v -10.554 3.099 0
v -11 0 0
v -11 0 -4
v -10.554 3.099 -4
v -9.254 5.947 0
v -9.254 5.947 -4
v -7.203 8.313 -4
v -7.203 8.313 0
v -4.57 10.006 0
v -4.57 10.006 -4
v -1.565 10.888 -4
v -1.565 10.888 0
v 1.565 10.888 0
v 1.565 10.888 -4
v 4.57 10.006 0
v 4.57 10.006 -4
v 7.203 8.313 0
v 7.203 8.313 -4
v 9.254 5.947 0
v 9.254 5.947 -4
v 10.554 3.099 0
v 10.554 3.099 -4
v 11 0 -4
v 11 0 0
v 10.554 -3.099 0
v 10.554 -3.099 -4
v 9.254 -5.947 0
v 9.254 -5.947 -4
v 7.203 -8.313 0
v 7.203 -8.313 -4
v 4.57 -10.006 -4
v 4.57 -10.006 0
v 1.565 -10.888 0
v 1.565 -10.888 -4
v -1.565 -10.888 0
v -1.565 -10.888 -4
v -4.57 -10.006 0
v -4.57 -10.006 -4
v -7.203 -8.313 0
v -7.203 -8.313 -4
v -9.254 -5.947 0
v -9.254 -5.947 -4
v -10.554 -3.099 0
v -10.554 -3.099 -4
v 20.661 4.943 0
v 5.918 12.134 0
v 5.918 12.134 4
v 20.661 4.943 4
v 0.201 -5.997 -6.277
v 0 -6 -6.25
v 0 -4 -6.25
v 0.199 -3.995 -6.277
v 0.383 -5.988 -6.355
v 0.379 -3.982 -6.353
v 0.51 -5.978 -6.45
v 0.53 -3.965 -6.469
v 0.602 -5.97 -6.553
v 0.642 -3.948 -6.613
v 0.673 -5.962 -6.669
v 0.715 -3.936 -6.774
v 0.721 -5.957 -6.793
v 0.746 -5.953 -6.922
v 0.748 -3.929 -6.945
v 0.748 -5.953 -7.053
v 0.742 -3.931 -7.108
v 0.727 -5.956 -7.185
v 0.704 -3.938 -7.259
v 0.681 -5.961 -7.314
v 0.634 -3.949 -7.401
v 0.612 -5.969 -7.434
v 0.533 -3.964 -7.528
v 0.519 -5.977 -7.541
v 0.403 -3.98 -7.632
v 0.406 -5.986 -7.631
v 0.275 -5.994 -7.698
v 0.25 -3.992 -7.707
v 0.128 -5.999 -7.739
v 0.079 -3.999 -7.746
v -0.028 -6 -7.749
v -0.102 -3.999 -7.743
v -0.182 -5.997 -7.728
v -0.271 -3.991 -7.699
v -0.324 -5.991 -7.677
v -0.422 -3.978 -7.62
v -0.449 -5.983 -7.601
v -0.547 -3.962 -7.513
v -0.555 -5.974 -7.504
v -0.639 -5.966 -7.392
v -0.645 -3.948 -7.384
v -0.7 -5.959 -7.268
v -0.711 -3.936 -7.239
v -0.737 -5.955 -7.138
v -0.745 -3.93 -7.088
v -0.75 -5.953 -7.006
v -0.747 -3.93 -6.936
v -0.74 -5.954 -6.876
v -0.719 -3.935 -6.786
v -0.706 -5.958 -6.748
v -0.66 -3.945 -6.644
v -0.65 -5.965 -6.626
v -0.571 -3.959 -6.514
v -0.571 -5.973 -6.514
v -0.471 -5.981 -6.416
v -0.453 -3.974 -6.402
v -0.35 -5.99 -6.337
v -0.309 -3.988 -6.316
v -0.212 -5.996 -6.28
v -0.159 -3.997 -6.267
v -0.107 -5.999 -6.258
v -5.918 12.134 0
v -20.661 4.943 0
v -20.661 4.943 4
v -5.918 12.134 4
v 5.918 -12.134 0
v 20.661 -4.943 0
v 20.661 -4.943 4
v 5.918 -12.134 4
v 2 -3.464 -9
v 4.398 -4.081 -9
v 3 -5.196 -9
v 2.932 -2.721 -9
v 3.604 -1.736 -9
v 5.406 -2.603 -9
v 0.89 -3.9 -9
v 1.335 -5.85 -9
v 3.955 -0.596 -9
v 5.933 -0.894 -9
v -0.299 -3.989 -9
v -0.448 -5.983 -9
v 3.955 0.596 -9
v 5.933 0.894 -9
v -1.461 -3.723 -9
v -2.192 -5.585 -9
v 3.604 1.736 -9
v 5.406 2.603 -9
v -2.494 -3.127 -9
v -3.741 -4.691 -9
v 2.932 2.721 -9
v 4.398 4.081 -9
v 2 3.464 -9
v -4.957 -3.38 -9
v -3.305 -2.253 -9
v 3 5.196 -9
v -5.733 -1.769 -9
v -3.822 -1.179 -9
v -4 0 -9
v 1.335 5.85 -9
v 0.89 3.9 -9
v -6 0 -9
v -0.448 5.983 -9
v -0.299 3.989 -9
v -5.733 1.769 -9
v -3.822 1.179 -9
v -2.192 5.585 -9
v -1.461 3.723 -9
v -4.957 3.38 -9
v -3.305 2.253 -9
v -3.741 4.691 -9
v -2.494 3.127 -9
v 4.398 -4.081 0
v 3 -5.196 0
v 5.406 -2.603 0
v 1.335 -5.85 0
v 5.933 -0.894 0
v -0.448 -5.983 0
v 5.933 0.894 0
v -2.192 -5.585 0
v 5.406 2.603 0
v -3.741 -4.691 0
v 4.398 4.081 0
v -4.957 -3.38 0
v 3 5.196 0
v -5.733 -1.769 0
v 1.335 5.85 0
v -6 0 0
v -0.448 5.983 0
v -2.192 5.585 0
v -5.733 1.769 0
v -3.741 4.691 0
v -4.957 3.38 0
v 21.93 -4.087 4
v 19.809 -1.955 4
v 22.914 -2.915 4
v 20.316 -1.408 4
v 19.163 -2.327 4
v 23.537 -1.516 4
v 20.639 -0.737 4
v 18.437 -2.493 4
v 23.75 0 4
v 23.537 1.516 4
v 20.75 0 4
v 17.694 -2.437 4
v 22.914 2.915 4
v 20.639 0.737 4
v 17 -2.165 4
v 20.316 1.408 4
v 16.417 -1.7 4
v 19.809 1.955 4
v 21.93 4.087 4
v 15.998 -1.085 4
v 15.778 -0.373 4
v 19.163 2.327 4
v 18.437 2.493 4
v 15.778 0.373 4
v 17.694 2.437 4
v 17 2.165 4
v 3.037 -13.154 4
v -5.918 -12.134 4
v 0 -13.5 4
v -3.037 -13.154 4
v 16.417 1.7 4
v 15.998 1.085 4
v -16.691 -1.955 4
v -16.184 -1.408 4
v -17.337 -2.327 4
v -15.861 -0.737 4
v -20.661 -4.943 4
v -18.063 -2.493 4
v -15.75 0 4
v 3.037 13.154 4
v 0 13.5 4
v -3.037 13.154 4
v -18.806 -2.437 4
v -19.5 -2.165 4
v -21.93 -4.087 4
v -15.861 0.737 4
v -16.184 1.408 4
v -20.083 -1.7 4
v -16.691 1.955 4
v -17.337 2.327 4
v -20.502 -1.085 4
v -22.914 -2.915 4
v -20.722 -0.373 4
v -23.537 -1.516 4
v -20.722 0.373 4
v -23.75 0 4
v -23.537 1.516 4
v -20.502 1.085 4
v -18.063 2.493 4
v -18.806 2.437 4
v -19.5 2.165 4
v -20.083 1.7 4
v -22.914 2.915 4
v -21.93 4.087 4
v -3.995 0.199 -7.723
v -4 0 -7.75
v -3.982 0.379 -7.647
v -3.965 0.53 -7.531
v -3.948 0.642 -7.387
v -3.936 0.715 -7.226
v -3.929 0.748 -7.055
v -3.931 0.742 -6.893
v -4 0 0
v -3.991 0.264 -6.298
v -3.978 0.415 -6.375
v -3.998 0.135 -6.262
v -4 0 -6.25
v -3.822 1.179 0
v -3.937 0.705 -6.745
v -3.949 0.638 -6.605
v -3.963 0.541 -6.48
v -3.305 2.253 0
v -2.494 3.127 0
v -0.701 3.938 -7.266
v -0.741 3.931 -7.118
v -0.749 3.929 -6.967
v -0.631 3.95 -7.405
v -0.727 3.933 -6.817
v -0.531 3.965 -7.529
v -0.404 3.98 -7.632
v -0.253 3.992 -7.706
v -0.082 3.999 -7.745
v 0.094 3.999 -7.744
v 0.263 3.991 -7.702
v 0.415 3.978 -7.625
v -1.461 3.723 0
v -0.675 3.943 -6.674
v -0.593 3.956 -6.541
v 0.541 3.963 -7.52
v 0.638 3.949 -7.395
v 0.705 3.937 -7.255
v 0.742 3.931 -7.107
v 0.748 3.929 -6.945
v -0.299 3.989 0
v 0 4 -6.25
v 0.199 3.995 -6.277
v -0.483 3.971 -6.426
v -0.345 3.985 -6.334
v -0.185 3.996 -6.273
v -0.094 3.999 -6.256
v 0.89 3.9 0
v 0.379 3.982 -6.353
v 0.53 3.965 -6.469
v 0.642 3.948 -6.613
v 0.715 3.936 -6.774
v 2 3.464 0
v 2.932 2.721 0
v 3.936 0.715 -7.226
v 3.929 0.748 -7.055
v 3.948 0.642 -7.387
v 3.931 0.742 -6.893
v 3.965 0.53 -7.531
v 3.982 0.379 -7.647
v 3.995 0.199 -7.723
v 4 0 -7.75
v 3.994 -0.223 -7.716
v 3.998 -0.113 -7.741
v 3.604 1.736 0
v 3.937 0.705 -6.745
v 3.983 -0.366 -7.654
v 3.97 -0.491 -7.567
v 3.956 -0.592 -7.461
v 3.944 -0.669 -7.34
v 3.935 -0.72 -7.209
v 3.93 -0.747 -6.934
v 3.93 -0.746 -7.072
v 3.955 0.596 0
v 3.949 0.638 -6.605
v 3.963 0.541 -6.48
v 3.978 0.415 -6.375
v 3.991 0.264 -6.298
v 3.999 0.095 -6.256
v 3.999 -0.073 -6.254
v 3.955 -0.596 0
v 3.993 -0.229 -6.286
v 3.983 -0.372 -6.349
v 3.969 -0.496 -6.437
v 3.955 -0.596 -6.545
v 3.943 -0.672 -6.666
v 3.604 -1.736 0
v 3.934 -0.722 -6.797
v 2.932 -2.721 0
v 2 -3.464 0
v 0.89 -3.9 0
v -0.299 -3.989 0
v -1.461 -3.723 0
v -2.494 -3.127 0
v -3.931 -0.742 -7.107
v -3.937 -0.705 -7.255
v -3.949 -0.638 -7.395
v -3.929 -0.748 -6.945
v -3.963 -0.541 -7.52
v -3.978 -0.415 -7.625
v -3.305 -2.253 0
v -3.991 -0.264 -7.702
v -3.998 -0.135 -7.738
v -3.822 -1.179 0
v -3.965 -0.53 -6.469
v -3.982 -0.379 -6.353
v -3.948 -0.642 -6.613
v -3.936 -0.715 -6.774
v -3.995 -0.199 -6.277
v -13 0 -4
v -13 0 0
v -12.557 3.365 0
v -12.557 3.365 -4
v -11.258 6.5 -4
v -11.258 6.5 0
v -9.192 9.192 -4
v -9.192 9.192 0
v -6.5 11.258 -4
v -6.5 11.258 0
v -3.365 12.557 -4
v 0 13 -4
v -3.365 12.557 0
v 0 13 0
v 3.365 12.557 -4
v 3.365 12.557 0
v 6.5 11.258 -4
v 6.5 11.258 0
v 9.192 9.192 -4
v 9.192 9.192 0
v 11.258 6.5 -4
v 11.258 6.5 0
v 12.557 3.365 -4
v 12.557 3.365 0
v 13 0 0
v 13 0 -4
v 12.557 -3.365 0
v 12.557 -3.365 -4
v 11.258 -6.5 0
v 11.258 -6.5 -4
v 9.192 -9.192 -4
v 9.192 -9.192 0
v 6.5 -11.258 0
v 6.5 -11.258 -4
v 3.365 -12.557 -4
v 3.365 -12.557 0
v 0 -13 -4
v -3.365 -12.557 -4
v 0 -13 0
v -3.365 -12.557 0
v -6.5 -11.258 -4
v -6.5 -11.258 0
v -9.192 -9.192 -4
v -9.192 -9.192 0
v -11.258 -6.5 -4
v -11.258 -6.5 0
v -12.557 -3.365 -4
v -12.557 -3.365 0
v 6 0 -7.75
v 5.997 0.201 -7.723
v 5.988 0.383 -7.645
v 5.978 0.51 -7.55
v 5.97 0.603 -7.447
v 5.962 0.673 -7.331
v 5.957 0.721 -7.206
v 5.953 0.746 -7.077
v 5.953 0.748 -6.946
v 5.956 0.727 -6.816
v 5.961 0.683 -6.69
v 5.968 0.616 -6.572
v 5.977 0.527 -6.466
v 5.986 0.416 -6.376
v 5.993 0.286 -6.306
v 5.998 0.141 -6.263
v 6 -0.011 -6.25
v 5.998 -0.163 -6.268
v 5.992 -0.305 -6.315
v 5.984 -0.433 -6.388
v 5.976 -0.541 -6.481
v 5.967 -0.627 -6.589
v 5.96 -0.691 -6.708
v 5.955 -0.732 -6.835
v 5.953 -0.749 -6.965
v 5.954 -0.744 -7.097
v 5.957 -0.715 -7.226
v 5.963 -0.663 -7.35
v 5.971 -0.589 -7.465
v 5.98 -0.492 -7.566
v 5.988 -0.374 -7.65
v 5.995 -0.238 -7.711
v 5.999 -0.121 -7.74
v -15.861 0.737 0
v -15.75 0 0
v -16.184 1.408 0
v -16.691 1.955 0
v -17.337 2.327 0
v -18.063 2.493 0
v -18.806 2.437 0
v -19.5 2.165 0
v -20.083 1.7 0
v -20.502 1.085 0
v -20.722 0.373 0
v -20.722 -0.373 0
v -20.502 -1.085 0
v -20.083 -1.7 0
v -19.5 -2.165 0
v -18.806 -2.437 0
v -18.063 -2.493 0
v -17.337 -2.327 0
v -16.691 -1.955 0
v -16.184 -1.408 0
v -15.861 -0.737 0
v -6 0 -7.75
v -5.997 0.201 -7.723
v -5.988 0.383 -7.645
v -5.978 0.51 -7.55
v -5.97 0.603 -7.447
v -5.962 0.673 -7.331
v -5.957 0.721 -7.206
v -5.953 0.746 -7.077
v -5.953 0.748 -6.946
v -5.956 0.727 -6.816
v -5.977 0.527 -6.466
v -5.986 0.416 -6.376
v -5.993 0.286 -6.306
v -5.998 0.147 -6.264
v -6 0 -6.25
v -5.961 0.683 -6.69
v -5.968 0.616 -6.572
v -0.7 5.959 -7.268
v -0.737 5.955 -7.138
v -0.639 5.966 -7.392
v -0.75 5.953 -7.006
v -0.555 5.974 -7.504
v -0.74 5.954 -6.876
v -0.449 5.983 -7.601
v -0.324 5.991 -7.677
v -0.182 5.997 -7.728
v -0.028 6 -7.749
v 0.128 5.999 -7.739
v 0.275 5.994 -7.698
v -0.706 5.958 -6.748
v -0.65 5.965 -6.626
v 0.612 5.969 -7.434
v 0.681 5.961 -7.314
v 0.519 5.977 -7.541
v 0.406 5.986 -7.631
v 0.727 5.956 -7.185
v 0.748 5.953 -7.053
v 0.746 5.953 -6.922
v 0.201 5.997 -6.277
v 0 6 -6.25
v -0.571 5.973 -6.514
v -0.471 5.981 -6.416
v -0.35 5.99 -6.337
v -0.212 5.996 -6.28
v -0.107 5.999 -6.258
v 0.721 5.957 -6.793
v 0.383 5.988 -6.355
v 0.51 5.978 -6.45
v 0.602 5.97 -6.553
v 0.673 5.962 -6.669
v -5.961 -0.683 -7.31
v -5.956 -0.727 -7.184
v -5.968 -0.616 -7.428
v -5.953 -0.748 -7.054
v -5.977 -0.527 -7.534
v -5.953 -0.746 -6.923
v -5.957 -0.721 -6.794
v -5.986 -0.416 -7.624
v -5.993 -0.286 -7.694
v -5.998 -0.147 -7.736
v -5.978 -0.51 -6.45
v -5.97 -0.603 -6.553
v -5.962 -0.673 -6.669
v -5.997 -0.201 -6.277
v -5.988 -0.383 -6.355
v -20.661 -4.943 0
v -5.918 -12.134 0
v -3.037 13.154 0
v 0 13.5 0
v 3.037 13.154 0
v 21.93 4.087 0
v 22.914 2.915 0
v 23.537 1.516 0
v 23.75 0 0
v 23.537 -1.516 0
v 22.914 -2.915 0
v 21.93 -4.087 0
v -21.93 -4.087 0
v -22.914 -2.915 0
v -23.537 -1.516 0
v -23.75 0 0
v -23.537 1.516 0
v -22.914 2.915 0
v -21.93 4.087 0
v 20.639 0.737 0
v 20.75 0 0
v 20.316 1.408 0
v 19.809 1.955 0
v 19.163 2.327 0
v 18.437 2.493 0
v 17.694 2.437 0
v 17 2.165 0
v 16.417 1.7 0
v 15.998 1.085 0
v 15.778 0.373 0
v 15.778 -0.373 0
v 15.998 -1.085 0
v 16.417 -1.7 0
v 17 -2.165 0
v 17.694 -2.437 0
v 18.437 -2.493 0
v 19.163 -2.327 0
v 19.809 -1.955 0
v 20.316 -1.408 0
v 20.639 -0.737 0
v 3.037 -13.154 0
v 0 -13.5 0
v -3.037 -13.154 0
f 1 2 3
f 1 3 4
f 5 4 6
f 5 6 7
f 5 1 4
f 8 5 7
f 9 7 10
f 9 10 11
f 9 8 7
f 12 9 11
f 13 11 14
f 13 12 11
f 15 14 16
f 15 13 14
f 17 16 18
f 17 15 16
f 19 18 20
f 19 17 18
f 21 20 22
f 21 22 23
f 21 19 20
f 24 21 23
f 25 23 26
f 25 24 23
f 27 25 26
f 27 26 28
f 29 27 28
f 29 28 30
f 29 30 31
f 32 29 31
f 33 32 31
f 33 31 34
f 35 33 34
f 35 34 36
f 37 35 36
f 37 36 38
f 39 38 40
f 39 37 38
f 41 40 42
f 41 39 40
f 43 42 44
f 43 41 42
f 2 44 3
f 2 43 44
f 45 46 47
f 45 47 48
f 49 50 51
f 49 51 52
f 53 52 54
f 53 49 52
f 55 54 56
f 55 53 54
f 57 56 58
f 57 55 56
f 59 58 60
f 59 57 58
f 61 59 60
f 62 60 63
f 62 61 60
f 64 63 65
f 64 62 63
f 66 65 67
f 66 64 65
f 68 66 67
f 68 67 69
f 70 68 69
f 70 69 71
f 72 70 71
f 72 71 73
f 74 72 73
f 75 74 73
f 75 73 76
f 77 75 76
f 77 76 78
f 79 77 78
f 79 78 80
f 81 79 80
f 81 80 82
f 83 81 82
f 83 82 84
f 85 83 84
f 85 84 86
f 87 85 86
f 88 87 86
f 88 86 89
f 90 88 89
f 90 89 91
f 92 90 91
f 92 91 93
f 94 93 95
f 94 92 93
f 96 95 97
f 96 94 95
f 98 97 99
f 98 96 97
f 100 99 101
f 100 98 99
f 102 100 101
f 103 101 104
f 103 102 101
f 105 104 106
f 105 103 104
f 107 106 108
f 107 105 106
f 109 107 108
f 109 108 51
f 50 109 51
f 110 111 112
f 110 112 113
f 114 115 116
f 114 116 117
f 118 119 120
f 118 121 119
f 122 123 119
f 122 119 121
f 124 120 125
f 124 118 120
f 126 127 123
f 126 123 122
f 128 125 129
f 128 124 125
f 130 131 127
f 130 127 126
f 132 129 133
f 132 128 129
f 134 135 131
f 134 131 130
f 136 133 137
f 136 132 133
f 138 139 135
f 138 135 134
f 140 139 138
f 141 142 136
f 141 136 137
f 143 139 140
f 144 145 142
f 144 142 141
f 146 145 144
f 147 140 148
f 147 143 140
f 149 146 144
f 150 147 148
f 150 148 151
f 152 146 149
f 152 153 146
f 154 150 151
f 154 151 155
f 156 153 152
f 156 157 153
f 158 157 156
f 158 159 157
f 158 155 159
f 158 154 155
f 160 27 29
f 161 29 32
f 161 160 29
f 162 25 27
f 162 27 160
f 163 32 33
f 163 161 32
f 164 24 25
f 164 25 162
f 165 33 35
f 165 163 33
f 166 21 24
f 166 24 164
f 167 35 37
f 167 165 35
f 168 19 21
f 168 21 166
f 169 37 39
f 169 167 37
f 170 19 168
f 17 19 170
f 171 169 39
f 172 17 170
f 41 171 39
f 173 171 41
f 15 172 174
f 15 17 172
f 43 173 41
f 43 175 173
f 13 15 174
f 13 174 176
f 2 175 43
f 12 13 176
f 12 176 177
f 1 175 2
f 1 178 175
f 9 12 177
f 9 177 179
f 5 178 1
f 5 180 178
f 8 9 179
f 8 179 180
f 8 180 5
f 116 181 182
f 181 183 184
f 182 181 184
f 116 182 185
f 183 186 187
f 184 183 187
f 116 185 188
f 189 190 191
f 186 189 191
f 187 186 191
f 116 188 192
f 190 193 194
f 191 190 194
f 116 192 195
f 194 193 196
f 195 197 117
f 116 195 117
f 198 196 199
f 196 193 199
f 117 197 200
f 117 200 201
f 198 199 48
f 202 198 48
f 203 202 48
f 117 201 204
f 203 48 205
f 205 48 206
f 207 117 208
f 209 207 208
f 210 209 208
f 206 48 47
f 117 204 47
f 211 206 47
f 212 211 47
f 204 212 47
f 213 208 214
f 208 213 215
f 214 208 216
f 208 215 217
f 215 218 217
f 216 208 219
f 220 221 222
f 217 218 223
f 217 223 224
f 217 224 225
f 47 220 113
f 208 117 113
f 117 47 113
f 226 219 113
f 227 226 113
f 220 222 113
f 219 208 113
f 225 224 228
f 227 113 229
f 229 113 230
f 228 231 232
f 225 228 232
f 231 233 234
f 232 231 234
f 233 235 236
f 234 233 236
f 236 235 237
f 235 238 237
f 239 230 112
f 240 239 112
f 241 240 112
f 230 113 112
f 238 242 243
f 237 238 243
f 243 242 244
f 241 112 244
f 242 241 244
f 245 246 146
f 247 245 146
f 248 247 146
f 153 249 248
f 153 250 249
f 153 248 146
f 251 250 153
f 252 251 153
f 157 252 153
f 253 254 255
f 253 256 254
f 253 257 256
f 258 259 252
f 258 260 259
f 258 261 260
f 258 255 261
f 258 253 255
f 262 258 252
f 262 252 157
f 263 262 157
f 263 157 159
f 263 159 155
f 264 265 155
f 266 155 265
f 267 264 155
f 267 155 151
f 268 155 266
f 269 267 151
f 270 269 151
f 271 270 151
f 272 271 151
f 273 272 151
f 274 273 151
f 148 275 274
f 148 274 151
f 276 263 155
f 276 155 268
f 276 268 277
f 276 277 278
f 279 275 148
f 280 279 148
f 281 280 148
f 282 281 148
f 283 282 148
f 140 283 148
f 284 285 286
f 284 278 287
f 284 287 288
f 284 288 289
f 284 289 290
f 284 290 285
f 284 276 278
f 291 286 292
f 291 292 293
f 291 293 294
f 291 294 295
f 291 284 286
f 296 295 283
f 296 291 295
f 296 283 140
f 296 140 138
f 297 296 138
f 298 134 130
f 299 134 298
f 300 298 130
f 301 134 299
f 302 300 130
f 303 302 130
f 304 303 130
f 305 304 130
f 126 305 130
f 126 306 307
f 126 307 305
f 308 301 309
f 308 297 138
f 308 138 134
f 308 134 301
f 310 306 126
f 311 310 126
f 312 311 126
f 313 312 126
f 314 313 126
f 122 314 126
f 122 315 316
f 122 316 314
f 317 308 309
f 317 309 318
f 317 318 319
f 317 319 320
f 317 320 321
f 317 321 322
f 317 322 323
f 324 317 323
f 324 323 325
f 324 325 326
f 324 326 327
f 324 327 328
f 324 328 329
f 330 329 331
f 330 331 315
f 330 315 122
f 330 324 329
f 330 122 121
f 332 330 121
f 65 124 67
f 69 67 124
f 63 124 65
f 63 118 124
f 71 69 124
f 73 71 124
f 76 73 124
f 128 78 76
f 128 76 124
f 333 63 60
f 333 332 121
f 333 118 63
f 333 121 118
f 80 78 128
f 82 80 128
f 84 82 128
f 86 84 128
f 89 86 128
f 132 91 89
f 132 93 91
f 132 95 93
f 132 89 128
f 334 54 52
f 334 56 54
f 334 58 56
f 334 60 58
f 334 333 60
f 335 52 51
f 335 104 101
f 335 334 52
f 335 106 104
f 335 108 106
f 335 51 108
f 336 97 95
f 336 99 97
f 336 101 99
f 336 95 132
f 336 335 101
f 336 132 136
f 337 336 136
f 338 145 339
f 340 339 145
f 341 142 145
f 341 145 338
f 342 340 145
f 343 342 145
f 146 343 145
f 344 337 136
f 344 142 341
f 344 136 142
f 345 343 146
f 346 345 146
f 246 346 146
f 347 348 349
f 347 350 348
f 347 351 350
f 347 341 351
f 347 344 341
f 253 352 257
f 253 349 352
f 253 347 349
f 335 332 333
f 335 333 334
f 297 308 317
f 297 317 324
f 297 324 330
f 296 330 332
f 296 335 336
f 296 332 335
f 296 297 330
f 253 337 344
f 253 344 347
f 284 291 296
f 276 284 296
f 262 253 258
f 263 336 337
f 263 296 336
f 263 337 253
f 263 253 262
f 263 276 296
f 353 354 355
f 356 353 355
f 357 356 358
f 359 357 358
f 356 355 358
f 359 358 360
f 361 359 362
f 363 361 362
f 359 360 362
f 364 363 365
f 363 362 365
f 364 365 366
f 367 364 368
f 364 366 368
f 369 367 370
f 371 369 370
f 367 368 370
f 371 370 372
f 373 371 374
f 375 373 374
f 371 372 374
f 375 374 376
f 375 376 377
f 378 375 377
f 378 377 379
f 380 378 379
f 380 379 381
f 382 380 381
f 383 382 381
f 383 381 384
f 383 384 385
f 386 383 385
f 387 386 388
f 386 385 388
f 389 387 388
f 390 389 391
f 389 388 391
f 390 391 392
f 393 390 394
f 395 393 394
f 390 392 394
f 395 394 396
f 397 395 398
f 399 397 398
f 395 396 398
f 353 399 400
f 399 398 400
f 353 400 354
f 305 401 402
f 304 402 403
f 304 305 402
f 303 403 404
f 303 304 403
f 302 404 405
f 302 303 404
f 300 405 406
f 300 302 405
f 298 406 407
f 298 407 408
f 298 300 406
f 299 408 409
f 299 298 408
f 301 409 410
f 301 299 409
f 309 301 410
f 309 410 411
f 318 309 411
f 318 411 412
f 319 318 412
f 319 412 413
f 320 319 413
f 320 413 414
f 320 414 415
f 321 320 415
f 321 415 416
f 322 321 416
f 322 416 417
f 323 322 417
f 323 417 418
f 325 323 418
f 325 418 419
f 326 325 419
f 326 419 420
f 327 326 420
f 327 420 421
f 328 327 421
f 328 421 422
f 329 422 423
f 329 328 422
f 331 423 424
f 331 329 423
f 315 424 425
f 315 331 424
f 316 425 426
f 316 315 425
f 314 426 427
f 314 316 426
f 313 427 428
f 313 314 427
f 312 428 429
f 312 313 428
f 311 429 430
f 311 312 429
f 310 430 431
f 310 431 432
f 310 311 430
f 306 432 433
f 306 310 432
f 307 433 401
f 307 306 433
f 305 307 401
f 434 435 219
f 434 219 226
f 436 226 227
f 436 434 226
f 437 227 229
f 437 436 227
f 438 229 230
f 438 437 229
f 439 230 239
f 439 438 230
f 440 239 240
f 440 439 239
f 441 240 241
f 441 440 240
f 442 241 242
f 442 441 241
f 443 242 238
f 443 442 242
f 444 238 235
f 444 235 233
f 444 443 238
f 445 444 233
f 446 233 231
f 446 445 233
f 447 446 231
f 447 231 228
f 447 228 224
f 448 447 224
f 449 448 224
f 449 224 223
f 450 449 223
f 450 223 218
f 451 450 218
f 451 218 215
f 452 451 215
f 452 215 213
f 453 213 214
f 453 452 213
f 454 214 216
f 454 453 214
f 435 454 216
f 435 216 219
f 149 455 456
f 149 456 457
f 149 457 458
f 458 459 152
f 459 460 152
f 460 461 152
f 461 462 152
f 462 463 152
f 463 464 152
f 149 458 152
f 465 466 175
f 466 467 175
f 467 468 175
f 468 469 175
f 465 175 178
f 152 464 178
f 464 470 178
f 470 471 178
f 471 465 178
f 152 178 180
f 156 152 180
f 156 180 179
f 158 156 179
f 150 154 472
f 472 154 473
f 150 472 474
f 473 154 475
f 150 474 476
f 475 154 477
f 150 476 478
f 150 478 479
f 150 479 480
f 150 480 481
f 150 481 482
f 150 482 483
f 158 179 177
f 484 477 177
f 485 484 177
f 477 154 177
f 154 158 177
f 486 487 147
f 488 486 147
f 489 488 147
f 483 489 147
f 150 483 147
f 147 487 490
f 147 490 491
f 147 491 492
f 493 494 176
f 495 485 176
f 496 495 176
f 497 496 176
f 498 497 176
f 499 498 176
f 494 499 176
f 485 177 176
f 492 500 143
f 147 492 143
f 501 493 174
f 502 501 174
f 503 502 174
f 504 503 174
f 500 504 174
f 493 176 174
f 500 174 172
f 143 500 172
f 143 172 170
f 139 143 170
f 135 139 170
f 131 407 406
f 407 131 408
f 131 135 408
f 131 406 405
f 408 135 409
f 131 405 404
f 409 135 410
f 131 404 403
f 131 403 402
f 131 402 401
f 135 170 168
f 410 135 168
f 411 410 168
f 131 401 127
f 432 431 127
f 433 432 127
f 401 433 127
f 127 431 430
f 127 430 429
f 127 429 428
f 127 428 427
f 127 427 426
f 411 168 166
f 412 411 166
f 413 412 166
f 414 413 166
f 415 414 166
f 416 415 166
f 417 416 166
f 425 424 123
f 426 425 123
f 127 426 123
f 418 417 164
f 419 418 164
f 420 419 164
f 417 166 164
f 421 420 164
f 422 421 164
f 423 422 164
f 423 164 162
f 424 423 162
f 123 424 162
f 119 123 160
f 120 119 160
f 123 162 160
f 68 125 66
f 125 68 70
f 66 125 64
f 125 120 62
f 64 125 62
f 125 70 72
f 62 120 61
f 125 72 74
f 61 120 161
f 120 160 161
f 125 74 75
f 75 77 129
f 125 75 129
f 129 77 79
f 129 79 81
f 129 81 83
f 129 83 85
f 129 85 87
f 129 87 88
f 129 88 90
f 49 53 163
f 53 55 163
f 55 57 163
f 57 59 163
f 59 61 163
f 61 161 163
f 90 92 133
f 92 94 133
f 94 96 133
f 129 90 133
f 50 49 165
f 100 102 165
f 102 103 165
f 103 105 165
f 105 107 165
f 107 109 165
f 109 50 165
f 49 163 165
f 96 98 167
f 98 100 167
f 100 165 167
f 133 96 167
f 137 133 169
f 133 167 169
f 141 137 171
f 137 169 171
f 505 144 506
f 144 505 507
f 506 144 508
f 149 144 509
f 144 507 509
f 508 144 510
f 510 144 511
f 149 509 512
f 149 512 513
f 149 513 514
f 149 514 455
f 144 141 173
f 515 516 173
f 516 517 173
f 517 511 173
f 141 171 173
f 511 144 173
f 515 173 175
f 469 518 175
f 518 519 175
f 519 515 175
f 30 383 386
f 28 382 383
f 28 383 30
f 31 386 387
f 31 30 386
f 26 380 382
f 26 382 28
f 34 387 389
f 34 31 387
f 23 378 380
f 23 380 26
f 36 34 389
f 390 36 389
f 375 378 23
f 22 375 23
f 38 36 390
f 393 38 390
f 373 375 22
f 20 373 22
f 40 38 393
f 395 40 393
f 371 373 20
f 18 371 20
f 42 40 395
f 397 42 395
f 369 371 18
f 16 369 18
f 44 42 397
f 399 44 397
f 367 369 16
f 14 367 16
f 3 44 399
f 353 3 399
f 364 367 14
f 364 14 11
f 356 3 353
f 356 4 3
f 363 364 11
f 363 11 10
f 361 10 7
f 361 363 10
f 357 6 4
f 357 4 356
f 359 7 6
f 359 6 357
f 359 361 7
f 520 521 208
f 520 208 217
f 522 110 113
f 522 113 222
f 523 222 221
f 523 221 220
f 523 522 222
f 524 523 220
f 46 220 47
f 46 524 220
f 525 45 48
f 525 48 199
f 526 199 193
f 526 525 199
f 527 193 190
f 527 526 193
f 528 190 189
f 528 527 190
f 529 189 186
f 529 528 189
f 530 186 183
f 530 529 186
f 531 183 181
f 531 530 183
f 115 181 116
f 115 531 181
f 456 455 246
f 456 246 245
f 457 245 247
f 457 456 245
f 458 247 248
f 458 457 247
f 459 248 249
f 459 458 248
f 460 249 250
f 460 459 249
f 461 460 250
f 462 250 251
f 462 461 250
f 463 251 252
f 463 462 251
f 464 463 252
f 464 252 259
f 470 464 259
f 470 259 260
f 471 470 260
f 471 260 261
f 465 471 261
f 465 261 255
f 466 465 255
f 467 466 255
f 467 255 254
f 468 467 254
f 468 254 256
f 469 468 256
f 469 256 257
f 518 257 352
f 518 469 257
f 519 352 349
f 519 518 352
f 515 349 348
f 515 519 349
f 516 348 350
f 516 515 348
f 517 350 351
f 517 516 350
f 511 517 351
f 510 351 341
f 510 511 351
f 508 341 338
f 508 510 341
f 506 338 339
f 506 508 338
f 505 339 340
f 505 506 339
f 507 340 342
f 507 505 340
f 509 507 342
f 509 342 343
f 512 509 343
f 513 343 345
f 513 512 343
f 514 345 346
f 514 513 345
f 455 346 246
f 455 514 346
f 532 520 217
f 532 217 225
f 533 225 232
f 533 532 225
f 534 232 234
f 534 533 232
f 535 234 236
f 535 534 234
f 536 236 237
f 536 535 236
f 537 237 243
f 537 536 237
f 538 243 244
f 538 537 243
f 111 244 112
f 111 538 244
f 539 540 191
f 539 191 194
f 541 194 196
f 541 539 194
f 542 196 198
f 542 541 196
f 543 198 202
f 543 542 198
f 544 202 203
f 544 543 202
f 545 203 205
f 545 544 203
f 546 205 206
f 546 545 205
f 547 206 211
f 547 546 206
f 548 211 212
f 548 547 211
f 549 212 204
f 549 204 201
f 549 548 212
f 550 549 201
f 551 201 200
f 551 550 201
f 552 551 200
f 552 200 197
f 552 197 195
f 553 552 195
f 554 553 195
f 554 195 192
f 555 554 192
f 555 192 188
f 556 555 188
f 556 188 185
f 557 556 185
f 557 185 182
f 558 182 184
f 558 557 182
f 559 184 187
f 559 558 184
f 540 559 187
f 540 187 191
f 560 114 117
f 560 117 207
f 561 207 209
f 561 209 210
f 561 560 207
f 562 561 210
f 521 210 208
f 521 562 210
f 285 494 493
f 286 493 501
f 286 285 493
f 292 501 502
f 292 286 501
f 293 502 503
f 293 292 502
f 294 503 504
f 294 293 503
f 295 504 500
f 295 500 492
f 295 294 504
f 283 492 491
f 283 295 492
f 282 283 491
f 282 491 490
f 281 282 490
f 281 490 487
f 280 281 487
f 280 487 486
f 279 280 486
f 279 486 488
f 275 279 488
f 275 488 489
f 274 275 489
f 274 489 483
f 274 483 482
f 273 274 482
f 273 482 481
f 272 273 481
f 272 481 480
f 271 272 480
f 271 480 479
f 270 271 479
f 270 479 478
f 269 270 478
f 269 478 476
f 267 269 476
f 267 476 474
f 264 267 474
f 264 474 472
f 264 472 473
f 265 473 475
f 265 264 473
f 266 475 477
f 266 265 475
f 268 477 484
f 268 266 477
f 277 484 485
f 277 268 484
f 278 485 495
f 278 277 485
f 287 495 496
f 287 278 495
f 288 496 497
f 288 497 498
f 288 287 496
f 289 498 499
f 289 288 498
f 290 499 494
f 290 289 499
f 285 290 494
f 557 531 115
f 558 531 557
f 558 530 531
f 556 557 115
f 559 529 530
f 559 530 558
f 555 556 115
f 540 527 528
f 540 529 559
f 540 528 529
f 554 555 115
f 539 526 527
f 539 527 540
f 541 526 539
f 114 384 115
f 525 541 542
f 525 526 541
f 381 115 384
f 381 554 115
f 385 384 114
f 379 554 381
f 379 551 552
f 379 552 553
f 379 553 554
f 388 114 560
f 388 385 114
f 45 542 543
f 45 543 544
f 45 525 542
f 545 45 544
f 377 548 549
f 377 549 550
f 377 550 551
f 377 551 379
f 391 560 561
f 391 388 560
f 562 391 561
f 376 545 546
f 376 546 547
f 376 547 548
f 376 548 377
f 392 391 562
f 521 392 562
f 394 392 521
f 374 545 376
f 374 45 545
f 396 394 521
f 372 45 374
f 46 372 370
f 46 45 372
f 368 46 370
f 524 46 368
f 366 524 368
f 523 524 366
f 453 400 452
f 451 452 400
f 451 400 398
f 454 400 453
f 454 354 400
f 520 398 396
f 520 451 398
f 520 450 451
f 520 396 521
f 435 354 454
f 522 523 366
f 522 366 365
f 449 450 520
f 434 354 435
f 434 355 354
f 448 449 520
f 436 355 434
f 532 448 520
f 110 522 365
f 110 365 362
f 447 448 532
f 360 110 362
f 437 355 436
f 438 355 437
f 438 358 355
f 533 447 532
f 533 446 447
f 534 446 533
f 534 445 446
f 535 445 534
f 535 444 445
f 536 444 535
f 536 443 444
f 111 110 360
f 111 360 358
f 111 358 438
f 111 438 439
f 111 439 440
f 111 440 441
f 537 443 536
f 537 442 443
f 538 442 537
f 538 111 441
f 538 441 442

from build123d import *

# Parameters (mm, degrees)
SKETCH1_R               = 2.5
BOSS_EXTRUDE1_DEPTH     = 4
SKETCH2_R               = 13
SKETCH2_R_2             = 11
EXTRUDE_THIN1_DEPTH     = 4
SKETCH3_R               = 6
SKETCH3_R_2             = 4
EXTRUDE_THIN2_DEPTH     = 9
CUT_EXTRUDE1_DEPTH      = 29.763040521
CUT_EXTRUDE1_DEPTH_BACK = 29.763040521
SKETCH4_R               = 0.75
CUT_EXTRUDE2_DEPTH      = 29.763040552
CUT_EXTRUDE2_DEPTH_BACK = 29.763040552
SKETCH5_R               = 0.75


with BuildPart() as part:
    # Sketch1 → Boss-Extrude1 (new body)
    with BuildSketch(Plane.XY):
        with BuildLine():
            Line((-20.660958904, 4.943407445), (-5.917808219, 12.133818273))
            ThreePointArc((-5.917808219, 12.133818273), (0, 13.5), (5.917808219, 12.133818273))
            Line((5.917808219, 12.133818273), (20.660958904, 4.943407445))
            ThreePointArc((20.660958904, 4.943407445), (23.75, 0), (20.660958904, -4.943407445))
            Line((20.660958904, -4.943407445), (5.917808219, -12.133818273))
            ThreePointArc((5.917808219, -12.133818273), (0, -13.5), (-5.917808219, -12.133818273))
            Line((-5.917808219, -12.133818273), (-20.660958904, -4.943407445))
            ThreePointArc((-20.660958904, -4.943407445), (-23.75, 0), (-20.660958904, 4.943407445))
        make_face()
        with Locations((-18.25, 0)):
            Circle(SKETCH1_R, mode=Mode.SUBTRACT)
        with Locations((18.25, 0)):
            Circle(SKETCH1_R, mode=Mode.SUBTRACT)
    extrude(amount=BOSS_EXTRUDE1_DEPTH)

    # Sketch2 → Extrude-Thin1 (add)
    with BuildSketch(Plane(origin=(0, 0, 0), x_dir=(-1, 0, 0), z_dir=(0, 0, -1))):
        Circle(SKETCH2_R)
        Circle(SKETCH2_R_2, mode=Mode.SUBTRACT)
    extrude(amount=EXTRUDE_THIN1_DEPTH)

    # Sketch3 → Extrude-Thin2 (add)
    with BuildSketch(Plane(origin=(0, 0, 0), x_dir=(-1, 0, 0), z_dir=(0, 0, -1))):
        Circle(SKETCH3_R)
        Circle(SKETCH3_R_2, mode=Mode.SUBTRACT)
    extrude(amount=EXTRUDE_THIN2_DEPTH)

    # Sketch4 → Cut-Extrude1 (cut, two sides: drawn at the far end of the back side and taken through both)
    with BuildSketch(Plane(origin=(0, 0, 0), x_dir=(0, 0, -1), z_dir=(1, 0, 0)).offset(-CUT_EXTRUDE1_DEPTH_BACK)):
        with Locations((7, 0)):
            Circle(SKETCH4_R)
    extrude(amount=CUT_EXTRUDE1_DEPTH + CUT_EXTRUDE1_DEPTH_BACK, mode=Mode.SUBTRACT)

    # Sketch5 → Cut-Extrude2 (cut, two sides: drawn at the far end of the back side and taken through both)
    with BuildSketch(Plane(origin=(0, 0, 0), x_dir=(1, 0, 0), z_dir=(0, 1, 0)).offset(-CUT_EXTRUDE2_DEPTH_BACK)):
        with Locations(Location((0, 7, 0), (0, 0, 270))):
            Circle(SKETCH5_R)
    extrude(amount=CUT_EXTRUDE2_DEPTH + CUT_EXTRUDE2_DEPTH_BACK, mode=Mode.SUBTRACT)


solid = part.part
